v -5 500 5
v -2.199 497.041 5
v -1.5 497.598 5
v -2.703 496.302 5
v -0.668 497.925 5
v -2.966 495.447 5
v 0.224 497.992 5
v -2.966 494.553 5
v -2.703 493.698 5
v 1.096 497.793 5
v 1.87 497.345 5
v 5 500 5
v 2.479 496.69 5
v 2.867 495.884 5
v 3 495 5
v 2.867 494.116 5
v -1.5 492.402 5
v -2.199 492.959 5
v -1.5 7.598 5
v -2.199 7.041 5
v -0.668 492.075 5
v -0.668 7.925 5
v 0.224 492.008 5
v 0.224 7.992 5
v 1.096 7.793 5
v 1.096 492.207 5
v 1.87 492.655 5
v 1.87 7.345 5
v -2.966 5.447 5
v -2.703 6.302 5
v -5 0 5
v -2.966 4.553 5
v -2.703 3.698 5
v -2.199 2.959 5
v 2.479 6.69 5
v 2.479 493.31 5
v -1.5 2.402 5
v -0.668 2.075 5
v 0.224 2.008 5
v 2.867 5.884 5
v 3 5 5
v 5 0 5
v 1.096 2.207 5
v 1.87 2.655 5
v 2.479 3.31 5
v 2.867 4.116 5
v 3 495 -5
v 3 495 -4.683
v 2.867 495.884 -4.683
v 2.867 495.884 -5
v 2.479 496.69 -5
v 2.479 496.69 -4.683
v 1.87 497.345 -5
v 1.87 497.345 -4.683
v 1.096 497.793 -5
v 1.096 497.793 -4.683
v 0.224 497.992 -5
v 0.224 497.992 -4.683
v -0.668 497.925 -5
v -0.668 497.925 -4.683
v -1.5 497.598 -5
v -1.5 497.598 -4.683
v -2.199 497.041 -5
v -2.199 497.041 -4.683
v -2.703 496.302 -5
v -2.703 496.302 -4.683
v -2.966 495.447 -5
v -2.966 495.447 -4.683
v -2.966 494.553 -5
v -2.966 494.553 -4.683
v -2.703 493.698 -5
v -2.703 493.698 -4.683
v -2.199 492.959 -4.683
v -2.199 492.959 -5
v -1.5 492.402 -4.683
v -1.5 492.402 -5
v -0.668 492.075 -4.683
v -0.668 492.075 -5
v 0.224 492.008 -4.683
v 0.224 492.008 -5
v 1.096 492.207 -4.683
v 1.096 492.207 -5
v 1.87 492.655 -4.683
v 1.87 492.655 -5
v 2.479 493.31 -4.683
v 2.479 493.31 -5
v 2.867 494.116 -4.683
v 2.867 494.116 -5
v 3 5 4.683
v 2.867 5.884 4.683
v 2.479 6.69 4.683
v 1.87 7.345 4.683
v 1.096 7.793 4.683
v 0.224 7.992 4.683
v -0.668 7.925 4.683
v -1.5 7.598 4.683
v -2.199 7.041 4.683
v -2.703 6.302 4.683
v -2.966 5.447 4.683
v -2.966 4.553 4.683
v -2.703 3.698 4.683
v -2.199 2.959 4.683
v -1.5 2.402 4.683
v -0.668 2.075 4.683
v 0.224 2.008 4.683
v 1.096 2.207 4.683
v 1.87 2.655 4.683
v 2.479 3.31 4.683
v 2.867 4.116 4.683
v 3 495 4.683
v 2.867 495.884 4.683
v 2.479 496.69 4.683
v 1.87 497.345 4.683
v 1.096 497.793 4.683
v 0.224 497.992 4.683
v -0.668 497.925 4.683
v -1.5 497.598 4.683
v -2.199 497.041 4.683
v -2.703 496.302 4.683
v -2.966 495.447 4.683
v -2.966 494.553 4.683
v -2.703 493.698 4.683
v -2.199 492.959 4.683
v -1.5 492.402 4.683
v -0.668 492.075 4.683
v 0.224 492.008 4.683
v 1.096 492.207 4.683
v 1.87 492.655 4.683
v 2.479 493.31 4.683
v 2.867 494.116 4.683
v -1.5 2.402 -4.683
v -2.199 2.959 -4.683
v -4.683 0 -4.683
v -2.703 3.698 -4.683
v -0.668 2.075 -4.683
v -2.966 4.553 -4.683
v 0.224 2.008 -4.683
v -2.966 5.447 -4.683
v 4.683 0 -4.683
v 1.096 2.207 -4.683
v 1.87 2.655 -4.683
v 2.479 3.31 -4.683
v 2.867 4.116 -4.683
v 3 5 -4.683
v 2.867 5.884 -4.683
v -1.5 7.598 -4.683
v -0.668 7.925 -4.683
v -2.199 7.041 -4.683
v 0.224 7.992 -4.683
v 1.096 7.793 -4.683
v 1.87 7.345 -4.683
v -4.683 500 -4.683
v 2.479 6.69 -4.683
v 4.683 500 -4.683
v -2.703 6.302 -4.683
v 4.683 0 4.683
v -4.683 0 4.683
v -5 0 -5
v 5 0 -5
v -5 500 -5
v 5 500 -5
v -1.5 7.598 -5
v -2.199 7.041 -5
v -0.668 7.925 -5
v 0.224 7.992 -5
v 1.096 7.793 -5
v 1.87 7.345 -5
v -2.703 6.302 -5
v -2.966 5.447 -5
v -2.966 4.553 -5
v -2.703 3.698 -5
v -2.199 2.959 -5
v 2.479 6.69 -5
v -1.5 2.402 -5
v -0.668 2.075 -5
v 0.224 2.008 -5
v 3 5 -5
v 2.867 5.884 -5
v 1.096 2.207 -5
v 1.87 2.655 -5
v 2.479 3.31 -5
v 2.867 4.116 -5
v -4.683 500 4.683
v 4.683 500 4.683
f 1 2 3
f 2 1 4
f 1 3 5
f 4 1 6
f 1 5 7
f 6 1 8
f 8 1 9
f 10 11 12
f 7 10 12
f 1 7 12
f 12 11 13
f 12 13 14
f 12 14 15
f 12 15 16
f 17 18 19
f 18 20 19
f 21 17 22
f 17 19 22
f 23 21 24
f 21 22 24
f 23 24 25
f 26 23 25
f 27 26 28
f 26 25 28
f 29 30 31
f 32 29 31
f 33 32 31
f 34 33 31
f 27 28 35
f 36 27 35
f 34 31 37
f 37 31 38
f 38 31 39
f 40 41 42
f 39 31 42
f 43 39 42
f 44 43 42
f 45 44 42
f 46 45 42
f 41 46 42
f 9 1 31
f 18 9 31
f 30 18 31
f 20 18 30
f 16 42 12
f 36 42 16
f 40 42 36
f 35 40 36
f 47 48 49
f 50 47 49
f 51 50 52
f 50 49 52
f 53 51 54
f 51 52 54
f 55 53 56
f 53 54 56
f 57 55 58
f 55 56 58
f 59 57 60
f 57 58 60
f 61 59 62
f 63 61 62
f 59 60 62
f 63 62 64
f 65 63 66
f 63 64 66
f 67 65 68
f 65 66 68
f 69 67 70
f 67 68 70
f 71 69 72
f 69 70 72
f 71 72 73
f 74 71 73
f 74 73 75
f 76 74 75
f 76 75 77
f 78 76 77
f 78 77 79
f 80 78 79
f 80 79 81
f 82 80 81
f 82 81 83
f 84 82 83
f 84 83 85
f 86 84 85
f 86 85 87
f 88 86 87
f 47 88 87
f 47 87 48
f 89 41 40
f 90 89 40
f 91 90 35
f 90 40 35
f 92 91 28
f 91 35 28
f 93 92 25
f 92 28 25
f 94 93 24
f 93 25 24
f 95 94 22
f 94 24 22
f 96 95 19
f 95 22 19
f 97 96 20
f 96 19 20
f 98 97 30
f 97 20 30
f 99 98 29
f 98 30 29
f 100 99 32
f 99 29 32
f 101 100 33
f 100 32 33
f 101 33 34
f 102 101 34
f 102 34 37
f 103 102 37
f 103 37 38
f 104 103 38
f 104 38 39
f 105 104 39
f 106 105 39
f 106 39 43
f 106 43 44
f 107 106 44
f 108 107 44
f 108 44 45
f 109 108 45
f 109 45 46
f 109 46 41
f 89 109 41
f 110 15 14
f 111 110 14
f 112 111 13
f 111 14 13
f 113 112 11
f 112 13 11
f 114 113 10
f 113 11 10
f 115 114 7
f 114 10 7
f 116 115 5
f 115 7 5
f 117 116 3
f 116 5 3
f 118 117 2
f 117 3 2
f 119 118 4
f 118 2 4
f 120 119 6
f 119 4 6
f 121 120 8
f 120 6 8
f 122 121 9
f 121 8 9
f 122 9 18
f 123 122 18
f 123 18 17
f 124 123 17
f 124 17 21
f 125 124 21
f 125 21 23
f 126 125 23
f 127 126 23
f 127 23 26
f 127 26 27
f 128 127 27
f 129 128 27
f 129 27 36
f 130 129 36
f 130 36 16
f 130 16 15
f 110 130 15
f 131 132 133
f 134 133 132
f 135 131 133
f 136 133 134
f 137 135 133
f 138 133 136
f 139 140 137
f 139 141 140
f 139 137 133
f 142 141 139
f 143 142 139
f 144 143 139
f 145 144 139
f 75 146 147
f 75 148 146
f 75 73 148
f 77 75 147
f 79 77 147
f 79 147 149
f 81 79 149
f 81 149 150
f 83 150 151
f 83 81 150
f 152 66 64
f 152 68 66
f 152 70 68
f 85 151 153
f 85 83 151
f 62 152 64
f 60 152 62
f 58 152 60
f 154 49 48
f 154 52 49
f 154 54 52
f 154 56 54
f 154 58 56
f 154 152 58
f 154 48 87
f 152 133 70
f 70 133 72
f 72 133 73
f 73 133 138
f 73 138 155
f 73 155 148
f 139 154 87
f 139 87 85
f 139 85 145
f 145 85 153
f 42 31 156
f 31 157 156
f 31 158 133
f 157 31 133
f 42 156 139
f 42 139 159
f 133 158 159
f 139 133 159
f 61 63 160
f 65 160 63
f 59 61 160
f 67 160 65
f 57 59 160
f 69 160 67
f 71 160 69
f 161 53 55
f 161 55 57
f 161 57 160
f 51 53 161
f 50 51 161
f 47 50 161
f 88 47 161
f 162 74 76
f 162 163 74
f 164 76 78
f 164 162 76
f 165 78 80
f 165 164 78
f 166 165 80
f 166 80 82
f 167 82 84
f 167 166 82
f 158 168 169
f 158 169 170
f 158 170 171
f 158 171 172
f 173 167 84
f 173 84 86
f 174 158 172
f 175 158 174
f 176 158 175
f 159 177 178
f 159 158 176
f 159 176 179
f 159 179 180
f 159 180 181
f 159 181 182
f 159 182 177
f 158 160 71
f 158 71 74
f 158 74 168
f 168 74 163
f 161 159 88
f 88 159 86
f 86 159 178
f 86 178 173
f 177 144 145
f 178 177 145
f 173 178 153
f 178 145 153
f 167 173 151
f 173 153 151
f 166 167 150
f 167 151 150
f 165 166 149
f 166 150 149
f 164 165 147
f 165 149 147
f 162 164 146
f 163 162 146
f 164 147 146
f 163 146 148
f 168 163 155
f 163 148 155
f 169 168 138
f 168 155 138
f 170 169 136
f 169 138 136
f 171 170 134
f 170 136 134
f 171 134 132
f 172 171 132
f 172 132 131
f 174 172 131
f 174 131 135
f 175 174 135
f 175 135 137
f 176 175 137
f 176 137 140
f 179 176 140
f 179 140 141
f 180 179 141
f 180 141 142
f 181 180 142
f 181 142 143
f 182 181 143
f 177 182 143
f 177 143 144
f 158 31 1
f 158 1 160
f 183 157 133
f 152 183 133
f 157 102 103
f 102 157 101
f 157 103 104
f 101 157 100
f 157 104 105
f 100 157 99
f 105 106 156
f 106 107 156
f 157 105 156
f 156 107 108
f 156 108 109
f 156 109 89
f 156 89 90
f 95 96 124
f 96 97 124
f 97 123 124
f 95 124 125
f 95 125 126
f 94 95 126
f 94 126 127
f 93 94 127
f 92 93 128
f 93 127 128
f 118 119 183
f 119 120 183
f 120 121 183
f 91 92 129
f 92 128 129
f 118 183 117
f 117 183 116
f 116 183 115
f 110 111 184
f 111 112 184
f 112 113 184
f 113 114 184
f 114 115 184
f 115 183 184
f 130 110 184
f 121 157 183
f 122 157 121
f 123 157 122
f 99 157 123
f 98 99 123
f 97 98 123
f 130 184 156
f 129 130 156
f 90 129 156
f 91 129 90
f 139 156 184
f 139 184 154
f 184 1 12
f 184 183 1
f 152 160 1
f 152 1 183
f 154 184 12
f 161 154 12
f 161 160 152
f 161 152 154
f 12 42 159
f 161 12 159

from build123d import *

# Parameters (mm, degrees)
CROQUIS1_W              = 10
CROQUIS1_H              = 10
SALIENTE_EXTRUIR1_DEPTH = 500
CROQUIS2_W              = 9.366
CROQUIS2_H              = 9.366
CORTAR_EXTRUIR1_DEPTH   = 500
CROQUIS3_R              = 3
CORTAR_EXTRUIR2_DEPTH   = 500
CROQUIS4_R              = 3
CORTAR_EXTRUIR3_DEPTH   = 500


with BuildPart() as part:
    # Croquis1 → Saliente-Extruir1 (new body)
    with BuildSketch(Plane(origin=(0, 0, 0), x_dir=(1, 0, 0), z_dir=(0, 1, 0))):
        Rectangle(CROQUIS1_W, CROQUIS1_H)
    extrude(amount=SALIENTE_EXTRUIR1_DEPTH)

    # Croquis2 → Cortar-Extruir1 (cut)
    with BuildSketch(Plane(origin=(0, 500, 0), x_dir=(1, 0, 0), z_dir=(0, 1, 0))):
        Rectangle(CROQUIS2_W, CROQUIS2_H)
    extrude(amount=-CORTAR_EXTRUIR1_DEPTH, mode=Mode.SUBTRACT)

    # Croquis3 → Cortar-Extruir2 (cut)
    with BuildSketch(Plane.XY.offset(5)):
        with Locations((0, 5)):
            Circle(CROQUIS3_R)
    extrude(amount=-CORTAR_EXTRUIR2_DEPTH, mode=Mode.SUBTRACT)

    # Croquis4 → Cortar-Extruir3 (cut)
    with BuildSketch(Plane.XY.offset(5)):
        with Locations((0, 495)):
            Circle(CROQUIS4_R)
    extrude(amount=-CORTAR_EXTRUIR3_DEPTH, mode=Mode.SUBTRACT)


solid = part.part
